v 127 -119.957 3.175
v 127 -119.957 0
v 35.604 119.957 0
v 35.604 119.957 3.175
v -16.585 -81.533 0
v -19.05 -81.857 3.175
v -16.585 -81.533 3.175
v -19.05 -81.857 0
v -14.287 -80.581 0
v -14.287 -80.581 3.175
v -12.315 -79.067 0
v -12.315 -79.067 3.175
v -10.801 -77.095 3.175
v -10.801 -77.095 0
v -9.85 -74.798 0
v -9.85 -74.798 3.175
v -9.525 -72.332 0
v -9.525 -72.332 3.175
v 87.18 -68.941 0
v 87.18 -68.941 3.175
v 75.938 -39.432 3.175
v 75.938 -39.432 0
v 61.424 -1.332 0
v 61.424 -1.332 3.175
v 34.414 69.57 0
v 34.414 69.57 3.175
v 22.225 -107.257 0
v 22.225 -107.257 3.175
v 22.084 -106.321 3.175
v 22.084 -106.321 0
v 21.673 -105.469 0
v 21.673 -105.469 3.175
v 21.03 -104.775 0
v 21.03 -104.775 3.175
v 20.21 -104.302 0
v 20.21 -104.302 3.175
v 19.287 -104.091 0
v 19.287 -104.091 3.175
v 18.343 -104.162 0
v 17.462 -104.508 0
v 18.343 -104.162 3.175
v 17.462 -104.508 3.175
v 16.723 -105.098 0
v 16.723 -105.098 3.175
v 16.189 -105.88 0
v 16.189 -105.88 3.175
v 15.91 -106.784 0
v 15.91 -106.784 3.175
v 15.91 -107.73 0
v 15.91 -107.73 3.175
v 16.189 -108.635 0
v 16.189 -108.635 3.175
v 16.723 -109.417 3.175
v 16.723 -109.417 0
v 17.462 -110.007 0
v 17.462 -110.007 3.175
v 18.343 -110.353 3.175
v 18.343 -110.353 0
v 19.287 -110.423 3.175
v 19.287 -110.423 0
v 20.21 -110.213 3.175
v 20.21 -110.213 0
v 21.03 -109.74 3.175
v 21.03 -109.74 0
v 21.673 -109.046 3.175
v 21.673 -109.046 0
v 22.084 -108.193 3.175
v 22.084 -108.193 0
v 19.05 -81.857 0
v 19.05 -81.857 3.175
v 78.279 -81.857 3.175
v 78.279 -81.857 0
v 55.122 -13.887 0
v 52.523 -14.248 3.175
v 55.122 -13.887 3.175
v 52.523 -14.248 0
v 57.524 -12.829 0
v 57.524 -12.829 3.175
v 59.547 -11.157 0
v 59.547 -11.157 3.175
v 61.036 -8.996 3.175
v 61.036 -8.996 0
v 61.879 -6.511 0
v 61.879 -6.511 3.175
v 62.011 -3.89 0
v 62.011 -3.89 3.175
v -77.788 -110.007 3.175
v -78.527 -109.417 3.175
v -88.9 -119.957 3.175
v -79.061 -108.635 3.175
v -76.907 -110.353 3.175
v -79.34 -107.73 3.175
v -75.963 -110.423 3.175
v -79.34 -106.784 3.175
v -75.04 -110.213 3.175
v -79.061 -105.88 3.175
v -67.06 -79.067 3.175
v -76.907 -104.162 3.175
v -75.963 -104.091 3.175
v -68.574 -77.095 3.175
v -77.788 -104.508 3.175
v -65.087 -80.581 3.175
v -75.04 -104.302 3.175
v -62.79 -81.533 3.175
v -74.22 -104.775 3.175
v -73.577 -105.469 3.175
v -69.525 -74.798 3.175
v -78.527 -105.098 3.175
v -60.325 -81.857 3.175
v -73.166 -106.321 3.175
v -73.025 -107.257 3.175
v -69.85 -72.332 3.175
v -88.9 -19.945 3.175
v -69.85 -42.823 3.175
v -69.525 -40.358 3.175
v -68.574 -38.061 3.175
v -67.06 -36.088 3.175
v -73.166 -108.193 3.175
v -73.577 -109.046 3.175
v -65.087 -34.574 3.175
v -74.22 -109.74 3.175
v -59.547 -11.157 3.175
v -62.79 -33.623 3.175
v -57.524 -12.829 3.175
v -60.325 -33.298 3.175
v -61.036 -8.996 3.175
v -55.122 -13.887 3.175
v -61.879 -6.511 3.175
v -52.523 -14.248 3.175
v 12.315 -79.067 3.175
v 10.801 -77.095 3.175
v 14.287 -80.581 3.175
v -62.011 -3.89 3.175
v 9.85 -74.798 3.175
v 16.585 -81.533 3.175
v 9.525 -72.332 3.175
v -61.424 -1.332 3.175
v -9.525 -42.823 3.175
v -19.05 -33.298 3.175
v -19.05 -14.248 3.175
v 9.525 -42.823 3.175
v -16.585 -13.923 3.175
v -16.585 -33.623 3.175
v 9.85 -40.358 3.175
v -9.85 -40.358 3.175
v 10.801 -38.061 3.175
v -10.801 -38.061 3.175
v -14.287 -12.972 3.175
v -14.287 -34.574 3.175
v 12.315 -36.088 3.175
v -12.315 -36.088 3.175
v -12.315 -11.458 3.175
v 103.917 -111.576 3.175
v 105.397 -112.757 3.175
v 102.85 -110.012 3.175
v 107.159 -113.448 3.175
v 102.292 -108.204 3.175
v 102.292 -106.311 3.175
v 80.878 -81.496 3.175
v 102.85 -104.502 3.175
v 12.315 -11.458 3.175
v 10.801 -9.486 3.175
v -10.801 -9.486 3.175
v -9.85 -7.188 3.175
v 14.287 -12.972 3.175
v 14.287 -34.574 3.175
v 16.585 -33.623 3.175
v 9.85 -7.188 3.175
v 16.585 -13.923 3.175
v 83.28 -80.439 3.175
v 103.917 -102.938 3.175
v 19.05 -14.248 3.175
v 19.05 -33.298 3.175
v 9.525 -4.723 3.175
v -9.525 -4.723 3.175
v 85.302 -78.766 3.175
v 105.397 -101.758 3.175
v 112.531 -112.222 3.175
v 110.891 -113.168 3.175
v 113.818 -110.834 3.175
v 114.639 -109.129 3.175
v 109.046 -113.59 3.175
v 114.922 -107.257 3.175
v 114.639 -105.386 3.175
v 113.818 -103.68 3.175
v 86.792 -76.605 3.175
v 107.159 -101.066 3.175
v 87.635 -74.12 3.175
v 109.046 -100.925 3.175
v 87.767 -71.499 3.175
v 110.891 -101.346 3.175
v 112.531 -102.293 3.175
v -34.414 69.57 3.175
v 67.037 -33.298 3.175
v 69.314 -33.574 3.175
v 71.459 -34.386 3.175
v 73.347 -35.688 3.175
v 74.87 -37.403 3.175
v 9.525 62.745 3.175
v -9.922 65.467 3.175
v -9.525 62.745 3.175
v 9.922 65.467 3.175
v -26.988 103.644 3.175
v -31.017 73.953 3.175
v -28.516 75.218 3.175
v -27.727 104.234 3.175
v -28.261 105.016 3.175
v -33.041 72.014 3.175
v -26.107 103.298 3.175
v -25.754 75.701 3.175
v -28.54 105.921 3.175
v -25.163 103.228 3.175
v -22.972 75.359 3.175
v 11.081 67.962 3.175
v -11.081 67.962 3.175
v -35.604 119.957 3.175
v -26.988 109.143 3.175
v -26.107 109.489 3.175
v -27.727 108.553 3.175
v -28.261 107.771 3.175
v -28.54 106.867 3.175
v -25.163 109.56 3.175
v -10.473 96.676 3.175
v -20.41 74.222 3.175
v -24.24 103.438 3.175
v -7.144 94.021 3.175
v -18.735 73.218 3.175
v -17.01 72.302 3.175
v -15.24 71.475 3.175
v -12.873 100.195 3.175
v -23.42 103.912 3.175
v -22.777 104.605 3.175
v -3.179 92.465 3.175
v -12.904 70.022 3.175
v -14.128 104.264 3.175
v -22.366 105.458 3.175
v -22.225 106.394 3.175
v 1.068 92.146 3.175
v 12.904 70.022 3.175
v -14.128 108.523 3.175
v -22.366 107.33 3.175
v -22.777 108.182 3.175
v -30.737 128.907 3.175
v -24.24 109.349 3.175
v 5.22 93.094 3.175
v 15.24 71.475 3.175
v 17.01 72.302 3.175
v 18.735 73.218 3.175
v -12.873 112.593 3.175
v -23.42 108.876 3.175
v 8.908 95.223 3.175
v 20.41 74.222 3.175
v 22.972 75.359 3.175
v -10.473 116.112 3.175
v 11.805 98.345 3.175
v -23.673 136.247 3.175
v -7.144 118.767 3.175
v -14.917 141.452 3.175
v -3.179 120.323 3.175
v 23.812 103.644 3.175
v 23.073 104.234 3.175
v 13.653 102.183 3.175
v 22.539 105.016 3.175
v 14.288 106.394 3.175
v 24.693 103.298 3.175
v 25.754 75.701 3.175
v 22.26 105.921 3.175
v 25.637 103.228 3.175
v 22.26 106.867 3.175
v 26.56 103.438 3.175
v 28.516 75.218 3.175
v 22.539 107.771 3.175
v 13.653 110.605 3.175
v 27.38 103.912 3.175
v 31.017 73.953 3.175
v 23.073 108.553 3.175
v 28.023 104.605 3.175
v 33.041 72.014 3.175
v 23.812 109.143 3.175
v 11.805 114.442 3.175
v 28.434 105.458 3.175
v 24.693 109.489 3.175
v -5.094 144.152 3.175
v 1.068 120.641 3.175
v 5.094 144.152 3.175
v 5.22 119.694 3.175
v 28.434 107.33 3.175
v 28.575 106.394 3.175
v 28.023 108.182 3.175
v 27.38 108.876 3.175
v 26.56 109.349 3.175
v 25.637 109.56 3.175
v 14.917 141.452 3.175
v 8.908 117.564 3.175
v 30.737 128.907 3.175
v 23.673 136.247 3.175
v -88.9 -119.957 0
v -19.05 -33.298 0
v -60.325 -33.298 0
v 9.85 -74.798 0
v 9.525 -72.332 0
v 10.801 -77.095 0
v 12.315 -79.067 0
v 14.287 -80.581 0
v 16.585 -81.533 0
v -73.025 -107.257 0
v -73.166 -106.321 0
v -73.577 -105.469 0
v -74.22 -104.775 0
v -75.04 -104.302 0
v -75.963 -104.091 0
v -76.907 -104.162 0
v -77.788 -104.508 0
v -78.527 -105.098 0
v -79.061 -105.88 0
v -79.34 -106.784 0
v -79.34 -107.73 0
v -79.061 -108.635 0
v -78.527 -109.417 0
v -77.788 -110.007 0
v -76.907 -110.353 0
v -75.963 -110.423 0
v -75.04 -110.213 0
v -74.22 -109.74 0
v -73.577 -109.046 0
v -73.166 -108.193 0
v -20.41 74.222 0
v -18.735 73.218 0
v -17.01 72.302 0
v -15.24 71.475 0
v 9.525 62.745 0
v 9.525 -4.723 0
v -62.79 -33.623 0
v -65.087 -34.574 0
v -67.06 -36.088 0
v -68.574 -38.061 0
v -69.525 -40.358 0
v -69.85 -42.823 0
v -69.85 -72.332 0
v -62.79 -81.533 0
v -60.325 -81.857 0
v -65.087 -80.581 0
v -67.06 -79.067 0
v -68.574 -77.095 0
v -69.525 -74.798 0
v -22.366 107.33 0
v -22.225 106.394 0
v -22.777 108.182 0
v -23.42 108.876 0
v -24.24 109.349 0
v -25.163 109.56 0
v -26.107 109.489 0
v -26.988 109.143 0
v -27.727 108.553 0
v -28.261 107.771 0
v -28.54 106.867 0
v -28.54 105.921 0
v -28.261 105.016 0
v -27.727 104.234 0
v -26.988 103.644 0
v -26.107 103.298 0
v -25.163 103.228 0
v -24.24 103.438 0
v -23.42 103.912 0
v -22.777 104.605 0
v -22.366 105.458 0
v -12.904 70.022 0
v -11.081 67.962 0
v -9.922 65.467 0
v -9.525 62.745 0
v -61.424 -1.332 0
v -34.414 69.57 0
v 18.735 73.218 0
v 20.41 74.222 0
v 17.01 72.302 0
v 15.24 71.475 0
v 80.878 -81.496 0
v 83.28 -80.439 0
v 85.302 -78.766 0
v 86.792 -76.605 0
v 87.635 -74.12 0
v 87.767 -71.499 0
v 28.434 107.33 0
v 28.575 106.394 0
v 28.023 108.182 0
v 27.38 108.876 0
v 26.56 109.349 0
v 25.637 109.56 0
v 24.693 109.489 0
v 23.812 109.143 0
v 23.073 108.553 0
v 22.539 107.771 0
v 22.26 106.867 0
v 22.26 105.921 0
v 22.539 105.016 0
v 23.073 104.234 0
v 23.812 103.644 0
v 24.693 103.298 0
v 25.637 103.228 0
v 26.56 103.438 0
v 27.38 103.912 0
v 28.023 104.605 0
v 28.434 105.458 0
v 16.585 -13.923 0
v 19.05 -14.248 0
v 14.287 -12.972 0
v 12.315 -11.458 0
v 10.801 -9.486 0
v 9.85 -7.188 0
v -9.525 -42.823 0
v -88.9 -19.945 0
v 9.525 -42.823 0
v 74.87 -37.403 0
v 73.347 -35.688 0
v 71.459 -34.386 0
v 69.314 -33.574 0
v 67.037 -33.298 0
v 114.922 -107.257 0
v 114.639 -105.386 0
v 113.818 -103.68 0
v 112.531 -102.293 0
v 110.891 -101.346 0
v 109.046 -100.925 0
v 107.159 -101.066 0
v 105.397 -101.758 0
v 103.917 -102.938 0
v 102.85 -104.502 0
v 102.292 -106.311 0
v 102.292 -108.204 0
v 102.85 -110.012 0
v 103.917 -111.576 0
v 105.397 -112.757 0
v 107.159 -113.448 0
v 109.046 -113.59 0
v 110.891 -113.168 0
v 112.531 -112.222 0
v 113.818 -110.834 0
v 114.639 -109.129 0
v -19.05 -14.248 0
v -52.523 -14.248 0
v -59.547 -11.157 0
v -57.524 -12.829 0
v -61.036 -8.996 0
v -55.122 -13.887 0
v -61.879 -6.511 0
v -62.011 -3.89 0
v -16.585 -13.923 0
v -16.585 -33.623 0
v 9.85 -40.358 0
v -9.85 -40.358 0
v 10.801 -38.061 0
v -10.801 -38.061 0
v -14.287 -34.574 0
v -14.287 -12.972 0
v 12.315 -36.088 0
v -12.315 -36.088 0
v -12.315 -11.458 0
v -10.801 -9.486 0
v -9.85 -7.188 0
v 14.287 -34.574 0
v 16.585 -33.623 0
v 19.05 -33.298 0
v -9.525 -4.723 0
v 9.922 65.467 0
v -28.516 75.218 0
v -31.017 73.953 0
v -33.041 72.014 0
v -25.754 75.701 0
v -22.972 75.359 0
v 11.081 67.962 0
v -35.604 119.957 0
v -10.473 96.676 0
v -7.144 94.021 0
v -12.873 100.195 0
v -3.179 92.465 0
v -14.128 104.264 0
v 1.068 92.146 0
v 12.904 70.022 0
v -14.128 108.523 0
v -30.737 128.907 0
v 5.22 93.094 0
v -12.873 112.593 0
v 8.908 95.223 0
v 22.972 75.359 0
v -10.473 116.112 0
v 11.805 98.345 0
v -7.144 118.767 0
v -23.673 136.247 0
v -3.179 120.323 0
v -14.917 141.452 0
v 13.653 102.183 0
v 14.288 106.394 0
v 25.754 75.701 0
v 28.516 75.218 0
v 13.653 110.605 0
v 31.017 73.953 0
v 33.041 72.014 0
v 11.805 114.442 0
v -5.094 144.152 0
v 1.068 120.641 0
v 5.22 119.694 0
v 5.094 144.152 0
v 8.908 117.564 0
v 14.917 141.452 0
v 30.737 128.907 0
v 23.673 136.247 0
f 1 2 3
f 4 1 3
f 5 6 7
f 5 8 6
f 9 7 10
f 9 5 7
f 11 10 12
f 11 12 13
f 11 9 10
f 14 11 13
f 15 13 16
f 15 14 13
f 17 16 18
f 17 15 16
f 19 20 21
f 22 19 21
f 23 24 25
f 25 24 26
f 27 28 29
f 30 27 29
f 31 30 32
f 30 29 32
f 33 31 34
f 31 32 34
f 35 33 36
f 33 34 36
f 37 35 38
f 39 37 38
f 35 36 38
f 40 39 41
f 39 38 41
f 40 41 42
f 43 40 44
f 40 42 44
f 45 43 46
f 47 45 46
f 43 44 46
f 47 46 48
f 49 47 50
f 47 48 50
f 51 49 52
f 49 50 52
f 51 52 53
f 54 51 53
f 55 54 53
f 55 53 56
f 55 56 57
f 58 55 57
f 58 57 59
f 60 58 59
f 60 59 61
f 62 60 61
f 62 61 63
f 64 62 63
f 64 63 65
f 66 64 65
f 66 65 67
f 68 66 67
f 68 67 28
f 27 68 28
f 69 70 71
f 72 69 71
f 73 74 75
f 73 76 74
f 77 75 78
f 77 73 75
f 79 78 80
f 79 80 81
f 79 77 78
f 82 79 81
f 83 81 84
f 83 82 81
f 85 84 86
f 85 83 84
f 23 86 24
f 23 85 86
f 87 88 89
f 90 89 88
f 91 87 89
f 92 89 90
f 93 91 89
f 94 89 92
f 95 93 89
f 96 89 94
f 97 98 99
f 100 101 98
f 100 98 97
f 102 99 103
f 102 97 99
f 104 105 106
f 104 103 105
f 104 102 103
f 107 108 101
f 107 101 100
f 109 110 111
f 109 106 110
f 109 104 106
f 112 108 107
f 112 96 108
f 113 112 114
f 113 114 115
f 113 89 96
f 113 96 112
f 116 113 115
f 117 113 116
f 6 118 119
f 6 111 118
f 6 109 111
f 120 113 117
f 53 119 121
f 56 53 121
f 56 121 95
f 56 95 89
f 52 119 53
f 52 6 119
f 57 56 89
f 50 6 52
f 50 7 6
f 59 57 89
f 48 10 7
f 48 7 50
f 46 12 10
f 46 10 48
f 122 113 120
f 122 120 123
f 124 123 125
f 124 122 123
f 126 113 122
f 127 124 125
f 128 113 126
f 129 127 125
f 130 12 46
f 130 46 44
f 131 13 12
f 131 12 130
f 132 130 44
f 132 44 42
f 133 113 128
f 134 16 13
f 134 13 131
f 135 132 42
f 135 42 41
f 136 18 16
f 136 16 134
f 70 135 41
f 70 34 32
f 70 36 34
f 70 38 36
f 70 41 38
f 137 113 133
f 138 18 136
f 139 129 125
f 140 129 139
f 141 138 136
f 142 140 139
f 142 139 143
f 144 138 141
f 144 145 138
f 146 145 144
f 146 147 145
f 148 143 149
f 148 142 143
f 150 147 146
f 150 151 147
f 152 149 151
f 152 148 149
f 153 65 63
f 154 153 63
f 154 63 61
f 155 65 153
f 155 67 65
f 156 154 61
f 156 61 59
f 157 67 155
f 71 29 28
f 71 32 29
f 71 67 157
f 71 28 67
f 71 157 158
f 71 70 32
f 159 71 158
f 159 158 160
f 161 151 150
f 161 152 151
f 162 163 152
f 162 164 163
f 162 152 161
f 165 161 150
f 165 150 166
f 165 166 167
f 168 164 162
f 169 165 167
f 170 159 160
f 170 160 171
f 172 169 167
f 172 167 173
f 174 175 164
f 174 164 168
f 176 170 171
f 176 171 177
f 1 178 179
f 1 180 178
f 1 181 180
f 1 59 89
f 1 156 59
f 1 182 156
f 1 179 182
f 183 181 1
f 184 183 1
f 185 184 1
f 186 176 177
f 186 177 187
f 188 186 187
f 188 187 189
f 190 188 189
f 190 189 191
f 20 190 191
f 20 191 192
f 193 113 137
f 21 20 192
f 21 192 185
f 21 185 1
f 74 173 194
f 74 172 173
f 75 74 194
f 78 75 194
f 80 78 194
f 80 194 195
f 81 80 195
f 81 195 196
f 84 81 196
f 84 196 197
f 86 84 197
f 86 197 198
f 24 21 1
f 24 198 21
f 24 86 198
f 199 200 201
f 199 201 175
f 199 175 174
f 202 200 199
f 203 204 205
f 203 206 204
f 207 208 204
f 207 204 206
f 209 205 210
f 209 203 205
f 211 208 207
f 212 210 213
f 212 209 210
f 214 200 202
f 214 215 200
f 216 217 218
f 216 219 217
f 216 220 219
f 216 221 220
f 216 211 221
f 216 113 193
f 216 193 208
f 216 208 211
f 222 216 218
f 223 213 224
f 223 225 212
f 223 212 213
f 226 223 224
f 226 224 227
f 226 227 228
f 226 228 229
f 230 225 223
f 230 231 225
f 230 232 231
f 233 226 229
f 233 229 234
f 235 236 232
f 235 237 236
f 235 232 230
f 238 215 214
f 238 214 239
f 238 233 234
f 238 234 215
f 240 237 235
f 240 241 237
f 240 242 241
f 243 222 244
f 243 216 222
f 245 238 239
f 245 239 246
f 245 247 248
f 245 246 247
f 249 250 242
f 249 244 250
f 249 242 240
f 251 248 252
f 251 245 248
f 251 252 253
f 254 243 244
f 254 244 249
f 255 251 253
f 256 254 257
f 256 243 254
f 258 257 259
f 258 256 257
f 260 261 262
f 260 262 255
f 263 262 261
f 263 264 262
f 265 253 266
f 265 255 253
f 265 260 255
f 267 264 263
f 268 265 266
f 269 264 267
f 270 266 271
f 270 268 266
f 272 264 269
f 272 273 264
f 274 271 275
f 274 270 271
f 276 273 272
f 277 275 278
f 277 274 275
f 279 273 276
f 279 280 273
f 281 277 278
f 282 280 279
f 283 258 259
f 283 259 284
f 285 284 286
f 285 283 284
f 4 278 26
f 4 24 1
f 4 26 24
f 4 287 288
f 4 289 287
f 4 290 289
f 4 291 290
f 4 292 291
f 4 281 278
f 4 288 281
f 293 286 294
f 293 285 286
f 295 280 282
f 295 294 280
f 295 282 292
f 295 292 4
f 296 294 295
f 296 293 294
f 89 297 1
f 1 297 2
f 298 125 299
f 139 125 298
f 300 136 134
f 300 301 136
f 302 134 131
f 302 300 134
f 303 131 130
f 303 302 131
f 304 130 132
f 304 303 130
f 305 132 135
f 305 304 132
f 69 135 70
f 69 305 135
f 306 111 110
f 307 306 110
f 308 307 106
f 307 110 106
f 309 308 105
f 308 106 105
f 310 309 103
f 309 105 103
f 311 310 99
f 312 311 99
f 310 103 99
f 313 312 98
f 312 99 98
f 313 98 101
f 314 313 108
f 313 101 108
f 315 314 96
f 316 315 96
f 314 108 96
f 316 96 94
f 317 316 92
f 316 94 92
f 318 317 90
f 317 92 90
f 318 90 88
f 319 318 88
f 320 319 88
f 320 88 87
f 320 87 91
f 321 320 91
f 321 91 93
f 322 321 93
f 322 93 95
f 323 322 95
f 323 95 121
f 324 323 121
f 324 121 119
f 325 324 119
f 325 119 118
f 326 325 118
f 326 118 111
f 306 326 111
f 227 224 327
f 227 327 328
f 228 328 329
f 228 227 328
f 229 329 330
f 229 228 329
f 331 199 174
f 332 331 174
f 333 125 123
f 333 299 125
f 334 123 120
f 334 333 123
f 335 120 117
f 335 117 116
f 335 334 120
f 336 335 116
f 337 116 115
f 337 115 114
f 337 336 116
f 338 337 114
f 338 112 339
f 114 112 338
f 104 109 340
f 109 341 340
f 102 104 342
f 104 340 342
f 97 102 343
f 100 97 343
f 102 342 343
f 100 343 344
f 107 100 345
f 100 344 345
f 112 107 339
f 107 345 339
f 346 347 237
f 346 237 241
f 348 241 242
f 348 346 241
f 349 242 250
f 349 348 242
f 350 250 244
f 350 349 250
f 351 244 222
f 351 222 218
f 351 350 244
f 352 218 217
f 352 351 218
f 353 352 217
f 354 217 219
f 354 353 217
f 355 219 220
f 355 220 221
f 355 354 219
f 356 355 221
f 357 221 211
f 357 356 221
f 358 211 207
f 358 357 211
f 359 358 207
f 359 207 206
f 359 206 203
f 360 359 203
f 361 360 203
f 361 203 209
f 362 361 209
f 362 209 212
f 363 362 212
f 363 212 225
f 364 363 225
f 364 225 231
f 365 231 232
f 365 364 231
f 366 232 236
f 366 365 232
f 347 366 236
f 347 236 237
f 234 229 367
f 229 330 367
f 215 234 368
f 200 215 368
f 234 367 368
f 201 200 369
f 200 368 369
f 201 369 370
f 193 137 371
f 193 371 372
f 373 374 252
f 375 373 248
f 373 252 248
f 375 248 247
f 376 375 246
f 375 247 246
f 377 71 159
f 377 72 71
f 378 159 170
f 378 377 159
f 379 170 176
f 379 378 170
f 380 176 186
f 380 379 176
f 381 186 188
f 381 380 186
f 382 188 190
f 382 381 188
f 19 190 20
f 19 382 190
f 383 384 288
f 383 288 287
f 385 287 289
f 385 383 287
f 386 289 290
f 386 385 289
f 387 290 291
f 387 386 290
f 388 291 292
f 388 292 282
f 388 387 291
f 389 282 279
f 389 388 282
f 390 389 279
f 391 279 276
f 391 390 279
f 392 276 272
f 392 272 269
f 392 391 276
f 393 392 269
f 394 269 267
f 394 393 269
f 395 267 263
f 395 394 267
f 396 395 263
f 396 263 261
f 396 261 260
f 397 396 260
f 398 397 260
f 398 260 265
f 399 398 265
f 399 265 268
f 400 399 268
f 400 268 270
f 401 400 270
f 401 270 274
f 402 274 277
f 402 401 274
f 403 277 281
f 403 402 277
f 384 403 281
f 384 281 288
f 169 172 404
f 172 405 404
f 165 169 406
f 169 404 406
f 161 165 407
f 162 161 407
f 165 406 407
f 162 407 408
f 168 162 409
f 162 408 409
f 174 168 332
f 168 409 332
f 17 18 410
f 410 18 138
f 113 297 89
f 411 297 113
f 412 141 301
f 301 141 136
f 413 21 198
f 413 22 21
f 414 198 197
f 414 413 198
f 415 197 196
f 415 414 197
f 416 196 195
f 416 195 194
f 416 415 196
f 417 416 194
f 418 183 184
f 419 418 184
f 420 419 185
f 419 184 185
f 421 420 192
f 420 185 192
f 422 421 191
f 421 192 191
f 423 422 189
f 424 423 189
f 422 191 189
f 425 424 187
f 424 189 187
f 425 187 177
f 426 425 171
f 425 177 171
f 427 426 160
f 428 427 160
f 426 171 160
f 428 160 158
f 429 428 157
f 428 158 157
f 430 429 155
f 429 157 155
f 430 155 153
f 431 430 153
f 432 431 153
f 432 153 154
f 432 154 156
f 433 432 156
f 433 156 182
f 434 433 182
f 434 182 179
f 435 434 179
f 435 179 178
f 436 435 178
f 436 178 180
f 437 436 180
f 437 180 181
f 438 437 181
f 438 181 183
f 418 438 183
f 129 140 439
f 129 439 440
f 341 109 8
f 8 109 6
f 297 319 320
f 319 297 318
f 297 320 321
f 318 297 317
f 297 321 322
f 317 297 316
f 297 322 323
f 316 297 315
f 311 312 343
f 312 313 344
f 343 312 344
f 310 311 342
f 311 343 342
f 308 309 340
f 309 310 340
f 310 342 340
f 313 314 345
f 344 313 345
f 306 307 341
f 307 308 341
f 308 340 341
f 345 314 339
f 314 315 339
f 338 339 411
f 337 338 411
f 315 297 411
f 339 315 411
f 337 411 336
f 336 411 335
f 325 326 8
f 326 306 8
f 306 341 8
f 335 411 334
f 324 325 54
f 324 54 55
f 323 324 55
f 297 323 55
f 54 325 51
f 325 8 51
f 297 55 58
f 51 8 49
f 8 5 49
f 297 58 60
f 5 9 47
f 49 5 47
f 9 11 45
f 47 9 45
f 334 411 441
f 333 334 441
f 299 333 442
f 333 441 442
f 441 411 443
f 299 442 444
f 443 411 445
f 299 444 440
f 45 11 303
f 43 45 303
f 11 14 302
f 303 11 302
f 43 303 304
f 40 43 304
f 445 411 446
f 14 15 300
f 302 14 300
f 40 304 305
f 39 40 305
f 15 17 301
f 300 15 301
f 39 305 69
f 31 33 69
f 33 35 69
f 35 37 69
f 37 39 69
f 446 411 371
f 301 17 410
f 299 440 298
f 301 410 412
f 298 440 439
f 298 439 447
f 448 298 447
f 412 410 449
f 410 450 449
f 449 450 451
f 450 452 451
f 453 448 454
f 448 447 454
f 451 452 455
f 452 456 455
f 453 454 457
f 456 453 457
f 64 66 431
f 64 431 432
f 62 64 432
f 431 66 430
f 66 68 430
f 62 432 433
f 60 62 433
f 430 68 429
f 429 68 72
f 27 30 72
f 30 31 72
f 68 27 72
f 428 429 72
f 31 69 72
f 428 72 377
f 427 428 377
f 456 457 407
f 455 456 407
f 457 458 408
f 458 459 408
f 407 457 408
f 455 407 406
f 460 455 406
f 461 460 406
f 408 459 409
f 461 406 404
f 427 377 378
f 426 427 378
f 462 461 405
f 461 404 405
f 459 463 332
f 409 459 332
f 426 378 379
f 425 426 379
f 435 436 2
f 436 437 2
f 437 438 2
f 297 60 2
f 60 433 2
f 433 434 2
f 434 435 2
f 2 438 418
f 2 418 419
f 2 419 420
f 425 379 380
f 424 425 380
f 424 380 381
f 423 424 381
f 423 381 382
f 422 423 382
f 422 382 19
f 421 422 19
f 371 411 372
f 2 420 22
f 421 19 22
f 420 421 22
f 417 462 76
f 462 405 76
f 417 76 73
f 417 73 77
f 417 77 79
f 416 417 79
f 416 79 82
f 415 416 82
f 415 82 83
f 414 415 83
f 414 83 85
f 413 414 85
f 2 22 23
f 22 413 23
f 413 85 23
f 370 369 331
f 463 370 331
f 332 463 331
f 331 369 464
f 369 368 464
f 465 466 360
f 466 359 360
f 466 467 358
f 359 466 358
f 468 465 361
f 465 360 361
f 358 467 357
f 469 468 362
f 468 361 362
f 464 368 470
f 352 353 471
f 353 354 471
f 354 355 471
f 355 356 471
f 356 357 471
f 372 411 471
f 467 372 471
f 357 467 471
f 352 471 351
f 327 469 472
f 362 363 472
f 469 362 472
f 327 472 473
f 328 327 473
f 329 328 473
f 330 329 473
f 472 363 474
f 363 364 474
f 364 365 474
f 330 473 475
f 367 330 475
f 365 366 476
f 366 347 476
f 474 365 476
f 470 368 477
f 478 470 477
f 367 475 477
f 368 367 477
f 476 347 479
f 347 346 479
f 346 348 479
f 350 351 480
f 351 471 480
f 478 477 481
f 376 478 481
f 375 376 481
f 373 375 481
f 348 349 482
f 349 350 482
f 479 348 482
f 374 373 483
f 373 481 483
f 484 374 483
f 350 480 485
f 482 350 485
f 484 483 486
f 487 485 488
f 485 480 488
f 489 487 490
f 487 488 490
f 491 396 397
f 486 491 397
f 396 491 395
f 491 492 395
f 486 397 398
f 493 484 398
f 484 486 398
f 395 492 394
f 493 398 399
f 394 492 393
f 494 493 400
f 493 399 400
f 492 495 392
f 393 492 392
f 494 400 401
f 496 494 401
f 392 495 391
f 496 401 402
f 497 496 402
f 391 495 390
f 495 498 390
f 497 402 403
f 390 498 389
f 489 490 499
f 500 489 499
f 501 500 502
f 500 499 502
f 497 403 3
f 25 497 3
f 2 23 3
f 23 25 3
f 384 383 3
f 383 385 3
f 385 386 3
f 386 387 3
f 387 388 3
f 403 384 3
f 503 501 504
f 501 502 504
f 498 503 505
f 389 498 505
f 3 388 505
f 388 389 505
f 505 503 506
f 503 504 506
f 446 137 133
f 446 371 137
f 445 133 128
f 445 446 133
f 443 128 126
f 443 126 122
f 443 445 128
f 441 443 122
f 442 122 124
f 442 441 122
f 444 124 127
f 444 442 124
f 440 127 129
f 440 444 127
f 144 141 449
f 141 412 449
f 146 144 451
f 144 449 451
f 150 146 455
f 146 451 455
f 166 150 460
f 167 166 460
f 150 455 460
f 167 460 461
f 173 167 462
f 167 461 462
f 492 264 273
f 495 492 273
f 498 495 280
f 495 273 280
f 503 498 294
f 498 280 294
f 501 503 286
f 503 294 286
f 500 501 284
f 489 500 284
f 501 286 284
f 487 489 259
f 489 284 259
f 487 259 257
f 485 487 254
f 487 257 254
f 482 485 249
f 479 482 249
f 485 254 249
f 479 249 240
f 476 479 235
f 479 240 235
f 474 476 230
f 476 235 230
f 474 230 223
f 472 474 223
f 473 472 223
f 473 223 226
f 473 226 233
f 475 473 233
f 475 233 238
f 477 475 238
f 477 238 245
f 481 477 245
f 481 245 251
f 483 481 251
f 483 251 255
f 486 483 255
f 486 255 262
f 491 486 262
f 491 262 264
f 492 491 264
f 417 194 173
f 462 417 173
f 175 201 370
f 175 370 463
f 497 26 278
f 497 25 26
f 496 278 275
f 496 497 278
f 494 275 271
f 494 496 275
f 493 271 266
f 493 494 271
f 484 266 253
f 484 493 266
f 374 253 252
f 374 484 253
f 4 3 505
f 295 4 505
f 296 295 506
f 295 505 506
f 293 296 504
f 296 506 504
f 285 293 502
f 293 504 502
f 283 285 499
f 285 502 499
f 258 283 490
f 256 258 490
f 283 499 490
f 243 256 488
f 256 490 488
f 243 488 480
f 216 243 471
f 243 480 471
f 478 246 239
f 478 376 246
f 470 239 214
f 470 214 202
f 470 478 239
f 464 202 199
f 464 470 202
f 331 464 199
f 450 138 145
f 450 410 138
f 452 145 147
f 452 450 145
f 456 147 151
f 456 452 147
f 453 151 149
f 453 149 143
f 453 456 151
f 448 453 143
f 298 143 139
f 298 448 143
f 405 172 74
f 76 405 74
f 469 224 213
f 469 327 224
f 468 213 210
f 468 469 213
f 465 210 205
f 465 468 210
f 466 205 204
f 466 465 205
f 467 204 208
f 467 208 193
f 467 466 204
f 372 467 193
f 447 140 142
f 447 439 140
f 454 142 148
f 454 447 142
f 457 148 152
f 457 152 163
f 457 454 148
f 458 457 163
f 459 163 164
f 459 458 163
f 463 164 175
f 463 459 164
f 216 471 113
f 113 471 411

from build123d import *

# Parameters (mm, degrees)
SKETCH1_R           = 3.175
BOSS_EXTRUDE1_DEPTH = 3.175
SKETCH2_R           = 14.2875
CUT_EXTRUDE1_DEPTH  = 4.175
SKETCH4_R           = 6.35
SKETCH4_R_2         = 3.175
CUT_EXTRUDE2_DEPTH  = 4.175
SKETCH8_W           = 38.1
SKETCH8_H           = 100.0125
CUT_EXTRUDE3_DEPTH  = 4.175
SKETCH10_W          = 60.325
SKETCH10_H          = 48.559243464
CUT_EXTRUDE5_DEPTH  = 4.175
FILLET2_R           = 9.525


with BuildPart() as part:
    # Sketch1 → Boss-Extrude1 (new body)
    with BuildSketch(Plane.XY):
        with BuildLine():
            Line((-35.603982701, 119.957272705), (-127, -119.957272705))
            Line((-127, -119.957272705), (127, -119.957272705))
            Line((127, -119.957272705), (35.603982701, 119.957272705))
            ThreePointArc((35.603982701, 119.957272705), (0, 144.493850724), (-35.603982701, 119.957272705))
        make_face()
        with Locations((-25.4, 106.393850724)):
            Circle(SKETCH1_R, mode=Mode.SUBTRACT)
        with Locations((25.4, 106.393850724)):
            Circle(SKETCH1_R, mode=Mode.SUBTRACT)
    extrude(amount=BOSS_EXTRUDE1_DEPTH)

    # Sketch2 → Cut-Extrude1 (cut, through all)
    with BuildSketch(Plane.XY.offset(3.175)):
        with Locations((0, 106.393850724)):
            Circle(SKETCH2_R)
    extrude(amount=-CUT_EXTRUDE1_DEPTH, mode=Mode.SUBTRACT)

    # Sketch4 → Cut-Extrude2 (cut, through all)
    with BuildSketch(Plane.XY.offset(3.175)):
        with Locations((108.571571229, -107.257272705)):
            Circle(SKETCH4_R)
        with Locations((-76.2, -107.257272705)):
            Circle(SKETCH4_R_2)
        with Locations((19.05, -107.257272705)):
            Circle(SKETCH4_R_2)
    extrude(amount=-CUT_EXTRUDE2_DEPTH, mode=Mode.SUBTRACT)

    # Sketch8 → Cut-Extrude3 (cut, through all)
    with BuildSketch(Plane(origin=(0, 0, 0), x_dir=(-1, 0, 0), z_dir=(0, 0, -1))):
        with Locations((107.95, -69.951022705)):
            Rectangle(SKETCH8_W, SKETCH8_H)
    extrude(amount=-CUT_EXTRUDE3_DEPTH, mode=Mode.SUBTRACT)

    # Sketch10 → Cut-Extrude5 (cut, through all)
    with BuildSketch(Plane.XY.offset(3.175)):
        with BuildLine():
            Line((-9.525, 69.503684351), (-9.525, -14.248029241))
            Line((-9.525, -14.248029241), (-66.344311715, -14.248029241))
            Line((-66.344311715, -14.248029241), (-29.548259348, 82.34160822))
            ThreePointArc((-29.548259348, 82.34160822), (-20.56411854, 74.320075944), (-9.525, 69.503684351))
        make_face()
        with Locations((-39.6875, -57.577650973)):
            Rectangle(SKETCH10_W, SKETCH10_H)
        Polygon((9.525, -33.298029241), (9.525, -81.857272705), (92.100213987, -81.857272705), (73.601454572, -33.298029241), align=None)
        with BuildLine():
            Line((9.525, -14.248029241), (66.344311715, -14.248029241))
            Line((66.344311715, -14.248029241), (29.548259348, 82.34160822))
            ThreePointArc((29.548259348, 82.34160822), (20.56411854, 74.320075944), (9.525, 69.503684351))
            Line((9.525, 69.503684351), (9.525, -14.248029241))
        make_face()
    extrude(amount=-CUT_EXTRUDE5_DEPTH, mode=Mode.SUBTRACT)

    # Fillet2
    fillet2_edges = [part.edges().sort_by_distance(p)[0] for p in [
        (-29.548259348, 82.34160822, 1.5875),
        (-9.525, 69.503684351, 1.5875),
        (-9.525, -14.248029241, 1.5875),
        (-66.344311715, -14.248029241, 1.5875),
        (-69.85, -33.298029241, 1.5875),
        (-9.525, -33.298029241, 1.5875),
        (-9.525, -81.857272705, 1.5875),
        (-69.85, -81.857272705, 1.5875),
        (9.525, -33.298029241, 1.5875),
        (73.601454572, -33.298029241, 1.5875),
        (92.100213987, -81.857272705, 1.5875),
        (9.525, -81.857272705, 1.5875),
        (9.525, -14.248029241, 1.5875),
        (9.525, 69.503684351, 1.5875),
        (29.548259348, 82.34160822, 1.5875),
        (66.344311715, -14.248029241, 1.5875),
    ]]
    fillet(fillet2_edges, radius=FILLET2_R)


solid = part.part
